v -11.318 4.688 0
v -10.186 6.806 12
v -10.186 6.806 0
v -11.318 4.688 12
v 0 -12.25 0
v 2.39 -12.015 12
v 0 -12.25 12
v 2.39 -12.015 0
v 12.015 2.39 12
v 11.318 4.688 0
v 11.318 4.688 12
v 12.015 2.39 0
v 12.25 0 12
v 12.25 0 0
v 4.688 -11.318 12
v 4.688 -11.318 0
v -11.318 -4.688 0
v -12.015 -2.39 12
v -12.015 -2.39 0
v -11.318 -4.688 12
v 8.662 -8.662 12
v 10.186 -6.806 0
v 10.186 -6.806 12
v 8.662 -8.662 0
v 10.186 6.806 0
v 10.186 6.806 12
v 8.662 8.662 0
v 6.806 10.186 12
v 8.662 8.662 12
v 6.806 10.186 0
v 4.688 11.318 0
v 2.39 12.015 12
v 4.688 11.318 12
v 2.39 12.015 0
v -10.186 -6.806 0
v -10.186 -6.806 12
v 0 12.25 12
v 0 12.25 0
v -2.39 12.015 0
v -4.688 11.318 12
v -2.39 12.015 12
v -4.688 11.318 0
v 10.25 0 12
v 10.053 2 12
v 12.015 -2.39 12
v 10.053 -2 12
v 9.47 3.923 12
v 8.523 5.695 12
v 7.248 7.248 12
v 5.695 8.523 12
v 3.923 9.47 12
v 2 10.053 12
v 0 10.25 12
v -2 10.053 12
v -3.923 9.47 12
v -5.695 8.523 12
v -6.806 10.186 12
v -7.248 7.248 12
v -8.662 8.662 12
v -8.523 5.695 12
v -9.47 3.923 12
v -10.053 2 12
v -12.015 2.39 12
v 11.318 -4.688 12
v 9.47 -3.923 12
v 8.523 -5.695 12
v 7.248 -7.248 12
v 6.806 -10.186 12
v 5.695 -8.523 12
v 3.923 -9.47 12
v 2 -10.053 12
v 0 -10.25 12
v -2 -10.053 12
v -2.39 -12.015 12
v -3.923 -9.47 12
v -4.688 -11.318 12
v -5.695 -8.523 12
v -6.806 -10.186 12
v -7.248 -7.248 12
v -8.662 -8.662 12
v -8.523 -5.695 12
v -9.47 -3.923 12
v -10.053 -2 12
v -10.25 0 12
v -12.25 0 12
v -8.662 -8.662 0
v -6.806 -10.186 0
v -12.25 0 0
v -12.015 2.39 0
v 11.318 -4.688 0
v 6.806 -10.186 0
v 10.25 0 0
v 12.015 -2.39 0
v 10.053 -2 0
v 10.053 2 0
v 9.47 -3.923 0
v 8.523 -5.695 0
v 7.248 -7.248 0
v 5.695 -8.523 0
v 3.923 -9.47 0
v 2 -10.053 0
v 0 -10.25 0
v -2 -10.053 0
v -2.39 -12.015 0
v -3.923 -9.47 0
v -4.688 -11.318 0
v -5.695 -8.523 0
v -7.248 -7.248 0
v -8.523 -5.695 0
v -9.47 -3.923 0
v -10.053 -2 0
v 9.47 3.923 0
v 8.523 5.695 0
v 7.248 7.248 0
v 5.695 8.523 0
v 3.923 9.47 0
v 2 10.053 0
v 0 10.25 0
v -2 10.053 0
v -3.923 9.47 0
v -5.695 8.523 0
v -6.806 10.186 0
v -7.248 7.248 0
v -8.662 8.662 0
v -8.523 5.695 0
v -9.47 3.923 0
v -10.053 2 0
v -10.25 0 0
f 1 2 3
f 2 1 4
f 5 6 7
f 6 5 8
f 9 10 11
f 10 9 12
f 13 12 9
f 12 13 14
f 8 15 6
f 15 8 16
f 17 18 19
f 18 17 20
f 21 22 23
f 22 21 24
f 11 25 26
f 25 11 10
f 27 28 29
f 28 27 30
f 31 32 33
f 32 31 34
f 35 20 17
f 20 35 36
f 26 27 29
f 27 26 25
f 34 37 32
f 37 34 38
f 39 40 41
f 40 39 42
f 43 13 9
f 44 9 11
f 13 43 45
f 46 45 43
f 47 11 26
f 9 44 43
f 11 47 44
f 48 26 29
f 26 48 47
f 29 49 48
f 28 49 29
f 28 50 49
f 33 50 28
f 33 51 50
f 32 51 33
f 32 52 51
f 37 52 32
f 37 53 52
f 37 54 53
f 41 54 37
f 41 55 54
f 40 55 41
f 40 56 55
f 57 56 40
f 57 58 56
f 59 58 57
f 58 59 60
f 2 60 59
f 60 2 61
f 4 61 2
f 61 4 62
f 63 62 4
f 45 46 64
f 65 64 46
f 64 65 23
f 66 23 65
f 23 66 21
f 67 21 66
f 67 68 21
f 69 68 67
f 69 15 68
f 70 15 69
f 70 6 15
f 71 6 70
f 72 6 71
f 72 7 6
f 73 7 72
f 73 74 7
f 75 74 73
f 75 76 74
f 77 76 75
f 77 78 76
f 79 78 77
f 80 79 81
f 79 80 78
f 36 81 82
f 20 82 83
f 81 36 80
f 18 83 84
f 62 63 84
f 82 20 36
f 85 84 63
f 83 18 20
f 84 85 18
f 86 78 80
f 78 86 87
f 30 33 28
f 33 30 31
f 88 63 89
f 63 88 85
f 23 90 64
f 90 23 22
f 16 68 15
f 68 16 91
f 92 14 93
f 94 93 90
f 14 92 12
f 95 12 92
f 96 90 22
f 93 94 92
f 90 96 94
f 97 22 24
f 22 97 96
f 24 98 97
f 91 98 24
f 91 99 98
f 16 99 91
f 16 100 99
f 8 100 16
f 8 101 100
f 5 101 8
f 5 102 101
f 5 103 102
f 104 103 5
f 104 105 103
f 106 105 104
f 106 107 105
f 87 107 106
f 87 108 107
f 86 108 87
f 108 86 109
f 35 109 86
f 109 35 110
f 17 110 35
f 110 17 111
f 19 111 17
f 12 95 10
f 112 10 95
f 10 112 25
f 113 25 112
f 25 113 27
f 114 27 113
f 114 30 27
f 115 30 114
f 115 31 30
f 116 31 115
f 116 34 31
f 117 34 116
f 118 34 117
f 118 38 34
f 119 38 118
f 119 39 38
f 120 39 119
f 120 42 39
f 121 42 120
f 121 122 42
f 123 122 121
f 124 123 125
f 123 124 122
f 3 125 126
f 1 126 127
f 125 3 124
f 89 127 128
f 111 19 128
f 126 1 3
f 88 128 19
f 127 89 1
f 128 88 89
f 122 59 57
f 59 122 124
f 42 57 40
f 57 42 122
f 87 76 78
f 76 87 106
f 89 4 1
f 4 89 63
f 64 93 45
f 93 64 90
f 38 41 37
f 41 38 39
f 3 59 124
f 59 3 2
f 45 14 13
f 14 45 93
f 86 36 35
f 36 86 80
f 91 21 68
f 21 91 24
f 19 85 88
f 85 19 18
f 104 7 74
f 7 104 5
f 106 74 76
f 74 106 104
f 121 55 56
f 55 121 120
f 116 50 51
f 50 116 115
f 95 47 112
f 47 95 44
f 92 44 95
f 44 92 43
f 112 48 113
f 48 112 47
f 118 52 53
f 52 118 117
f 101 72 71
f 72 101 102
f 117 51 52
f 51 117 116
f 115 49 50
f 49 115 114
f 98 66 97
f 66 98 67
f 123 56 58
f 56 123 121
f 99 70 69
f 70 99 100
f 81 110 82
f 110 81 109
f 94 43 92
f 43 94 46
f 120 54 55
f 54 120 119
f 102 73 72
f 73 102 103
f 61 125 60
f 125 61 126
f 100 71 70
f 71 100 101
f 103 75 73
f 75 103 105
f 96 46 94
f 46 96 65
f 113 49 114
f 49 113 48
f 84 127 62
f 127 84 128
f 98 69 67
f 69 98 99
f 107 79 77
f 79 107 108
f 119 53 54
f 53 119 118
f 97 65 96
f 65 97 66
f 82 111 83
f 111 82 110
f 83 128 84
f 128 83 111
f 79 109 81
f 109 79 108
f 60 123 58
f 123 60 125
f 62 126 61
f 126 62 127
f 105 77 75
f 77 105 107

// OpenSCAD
$fn = 32;

// ----------------------------------------------------------------------
// Spacer sleeve: 24.5 / 20.5 x 12 mm
// ----------------------------------------------------------------------

// --- parameters (mm) ---
outer_d = 24.5;           // outside diameter
inner_d = 20.5;           // shaft bore
length = 12;              // sleeve length

module sleeve() {
  cylinder(h = length, d = outer_d);
}

difference() {
  sleeve();
  translate([0, 0, -1]) cylinder(h = length + 2, d = inner_d);
}
